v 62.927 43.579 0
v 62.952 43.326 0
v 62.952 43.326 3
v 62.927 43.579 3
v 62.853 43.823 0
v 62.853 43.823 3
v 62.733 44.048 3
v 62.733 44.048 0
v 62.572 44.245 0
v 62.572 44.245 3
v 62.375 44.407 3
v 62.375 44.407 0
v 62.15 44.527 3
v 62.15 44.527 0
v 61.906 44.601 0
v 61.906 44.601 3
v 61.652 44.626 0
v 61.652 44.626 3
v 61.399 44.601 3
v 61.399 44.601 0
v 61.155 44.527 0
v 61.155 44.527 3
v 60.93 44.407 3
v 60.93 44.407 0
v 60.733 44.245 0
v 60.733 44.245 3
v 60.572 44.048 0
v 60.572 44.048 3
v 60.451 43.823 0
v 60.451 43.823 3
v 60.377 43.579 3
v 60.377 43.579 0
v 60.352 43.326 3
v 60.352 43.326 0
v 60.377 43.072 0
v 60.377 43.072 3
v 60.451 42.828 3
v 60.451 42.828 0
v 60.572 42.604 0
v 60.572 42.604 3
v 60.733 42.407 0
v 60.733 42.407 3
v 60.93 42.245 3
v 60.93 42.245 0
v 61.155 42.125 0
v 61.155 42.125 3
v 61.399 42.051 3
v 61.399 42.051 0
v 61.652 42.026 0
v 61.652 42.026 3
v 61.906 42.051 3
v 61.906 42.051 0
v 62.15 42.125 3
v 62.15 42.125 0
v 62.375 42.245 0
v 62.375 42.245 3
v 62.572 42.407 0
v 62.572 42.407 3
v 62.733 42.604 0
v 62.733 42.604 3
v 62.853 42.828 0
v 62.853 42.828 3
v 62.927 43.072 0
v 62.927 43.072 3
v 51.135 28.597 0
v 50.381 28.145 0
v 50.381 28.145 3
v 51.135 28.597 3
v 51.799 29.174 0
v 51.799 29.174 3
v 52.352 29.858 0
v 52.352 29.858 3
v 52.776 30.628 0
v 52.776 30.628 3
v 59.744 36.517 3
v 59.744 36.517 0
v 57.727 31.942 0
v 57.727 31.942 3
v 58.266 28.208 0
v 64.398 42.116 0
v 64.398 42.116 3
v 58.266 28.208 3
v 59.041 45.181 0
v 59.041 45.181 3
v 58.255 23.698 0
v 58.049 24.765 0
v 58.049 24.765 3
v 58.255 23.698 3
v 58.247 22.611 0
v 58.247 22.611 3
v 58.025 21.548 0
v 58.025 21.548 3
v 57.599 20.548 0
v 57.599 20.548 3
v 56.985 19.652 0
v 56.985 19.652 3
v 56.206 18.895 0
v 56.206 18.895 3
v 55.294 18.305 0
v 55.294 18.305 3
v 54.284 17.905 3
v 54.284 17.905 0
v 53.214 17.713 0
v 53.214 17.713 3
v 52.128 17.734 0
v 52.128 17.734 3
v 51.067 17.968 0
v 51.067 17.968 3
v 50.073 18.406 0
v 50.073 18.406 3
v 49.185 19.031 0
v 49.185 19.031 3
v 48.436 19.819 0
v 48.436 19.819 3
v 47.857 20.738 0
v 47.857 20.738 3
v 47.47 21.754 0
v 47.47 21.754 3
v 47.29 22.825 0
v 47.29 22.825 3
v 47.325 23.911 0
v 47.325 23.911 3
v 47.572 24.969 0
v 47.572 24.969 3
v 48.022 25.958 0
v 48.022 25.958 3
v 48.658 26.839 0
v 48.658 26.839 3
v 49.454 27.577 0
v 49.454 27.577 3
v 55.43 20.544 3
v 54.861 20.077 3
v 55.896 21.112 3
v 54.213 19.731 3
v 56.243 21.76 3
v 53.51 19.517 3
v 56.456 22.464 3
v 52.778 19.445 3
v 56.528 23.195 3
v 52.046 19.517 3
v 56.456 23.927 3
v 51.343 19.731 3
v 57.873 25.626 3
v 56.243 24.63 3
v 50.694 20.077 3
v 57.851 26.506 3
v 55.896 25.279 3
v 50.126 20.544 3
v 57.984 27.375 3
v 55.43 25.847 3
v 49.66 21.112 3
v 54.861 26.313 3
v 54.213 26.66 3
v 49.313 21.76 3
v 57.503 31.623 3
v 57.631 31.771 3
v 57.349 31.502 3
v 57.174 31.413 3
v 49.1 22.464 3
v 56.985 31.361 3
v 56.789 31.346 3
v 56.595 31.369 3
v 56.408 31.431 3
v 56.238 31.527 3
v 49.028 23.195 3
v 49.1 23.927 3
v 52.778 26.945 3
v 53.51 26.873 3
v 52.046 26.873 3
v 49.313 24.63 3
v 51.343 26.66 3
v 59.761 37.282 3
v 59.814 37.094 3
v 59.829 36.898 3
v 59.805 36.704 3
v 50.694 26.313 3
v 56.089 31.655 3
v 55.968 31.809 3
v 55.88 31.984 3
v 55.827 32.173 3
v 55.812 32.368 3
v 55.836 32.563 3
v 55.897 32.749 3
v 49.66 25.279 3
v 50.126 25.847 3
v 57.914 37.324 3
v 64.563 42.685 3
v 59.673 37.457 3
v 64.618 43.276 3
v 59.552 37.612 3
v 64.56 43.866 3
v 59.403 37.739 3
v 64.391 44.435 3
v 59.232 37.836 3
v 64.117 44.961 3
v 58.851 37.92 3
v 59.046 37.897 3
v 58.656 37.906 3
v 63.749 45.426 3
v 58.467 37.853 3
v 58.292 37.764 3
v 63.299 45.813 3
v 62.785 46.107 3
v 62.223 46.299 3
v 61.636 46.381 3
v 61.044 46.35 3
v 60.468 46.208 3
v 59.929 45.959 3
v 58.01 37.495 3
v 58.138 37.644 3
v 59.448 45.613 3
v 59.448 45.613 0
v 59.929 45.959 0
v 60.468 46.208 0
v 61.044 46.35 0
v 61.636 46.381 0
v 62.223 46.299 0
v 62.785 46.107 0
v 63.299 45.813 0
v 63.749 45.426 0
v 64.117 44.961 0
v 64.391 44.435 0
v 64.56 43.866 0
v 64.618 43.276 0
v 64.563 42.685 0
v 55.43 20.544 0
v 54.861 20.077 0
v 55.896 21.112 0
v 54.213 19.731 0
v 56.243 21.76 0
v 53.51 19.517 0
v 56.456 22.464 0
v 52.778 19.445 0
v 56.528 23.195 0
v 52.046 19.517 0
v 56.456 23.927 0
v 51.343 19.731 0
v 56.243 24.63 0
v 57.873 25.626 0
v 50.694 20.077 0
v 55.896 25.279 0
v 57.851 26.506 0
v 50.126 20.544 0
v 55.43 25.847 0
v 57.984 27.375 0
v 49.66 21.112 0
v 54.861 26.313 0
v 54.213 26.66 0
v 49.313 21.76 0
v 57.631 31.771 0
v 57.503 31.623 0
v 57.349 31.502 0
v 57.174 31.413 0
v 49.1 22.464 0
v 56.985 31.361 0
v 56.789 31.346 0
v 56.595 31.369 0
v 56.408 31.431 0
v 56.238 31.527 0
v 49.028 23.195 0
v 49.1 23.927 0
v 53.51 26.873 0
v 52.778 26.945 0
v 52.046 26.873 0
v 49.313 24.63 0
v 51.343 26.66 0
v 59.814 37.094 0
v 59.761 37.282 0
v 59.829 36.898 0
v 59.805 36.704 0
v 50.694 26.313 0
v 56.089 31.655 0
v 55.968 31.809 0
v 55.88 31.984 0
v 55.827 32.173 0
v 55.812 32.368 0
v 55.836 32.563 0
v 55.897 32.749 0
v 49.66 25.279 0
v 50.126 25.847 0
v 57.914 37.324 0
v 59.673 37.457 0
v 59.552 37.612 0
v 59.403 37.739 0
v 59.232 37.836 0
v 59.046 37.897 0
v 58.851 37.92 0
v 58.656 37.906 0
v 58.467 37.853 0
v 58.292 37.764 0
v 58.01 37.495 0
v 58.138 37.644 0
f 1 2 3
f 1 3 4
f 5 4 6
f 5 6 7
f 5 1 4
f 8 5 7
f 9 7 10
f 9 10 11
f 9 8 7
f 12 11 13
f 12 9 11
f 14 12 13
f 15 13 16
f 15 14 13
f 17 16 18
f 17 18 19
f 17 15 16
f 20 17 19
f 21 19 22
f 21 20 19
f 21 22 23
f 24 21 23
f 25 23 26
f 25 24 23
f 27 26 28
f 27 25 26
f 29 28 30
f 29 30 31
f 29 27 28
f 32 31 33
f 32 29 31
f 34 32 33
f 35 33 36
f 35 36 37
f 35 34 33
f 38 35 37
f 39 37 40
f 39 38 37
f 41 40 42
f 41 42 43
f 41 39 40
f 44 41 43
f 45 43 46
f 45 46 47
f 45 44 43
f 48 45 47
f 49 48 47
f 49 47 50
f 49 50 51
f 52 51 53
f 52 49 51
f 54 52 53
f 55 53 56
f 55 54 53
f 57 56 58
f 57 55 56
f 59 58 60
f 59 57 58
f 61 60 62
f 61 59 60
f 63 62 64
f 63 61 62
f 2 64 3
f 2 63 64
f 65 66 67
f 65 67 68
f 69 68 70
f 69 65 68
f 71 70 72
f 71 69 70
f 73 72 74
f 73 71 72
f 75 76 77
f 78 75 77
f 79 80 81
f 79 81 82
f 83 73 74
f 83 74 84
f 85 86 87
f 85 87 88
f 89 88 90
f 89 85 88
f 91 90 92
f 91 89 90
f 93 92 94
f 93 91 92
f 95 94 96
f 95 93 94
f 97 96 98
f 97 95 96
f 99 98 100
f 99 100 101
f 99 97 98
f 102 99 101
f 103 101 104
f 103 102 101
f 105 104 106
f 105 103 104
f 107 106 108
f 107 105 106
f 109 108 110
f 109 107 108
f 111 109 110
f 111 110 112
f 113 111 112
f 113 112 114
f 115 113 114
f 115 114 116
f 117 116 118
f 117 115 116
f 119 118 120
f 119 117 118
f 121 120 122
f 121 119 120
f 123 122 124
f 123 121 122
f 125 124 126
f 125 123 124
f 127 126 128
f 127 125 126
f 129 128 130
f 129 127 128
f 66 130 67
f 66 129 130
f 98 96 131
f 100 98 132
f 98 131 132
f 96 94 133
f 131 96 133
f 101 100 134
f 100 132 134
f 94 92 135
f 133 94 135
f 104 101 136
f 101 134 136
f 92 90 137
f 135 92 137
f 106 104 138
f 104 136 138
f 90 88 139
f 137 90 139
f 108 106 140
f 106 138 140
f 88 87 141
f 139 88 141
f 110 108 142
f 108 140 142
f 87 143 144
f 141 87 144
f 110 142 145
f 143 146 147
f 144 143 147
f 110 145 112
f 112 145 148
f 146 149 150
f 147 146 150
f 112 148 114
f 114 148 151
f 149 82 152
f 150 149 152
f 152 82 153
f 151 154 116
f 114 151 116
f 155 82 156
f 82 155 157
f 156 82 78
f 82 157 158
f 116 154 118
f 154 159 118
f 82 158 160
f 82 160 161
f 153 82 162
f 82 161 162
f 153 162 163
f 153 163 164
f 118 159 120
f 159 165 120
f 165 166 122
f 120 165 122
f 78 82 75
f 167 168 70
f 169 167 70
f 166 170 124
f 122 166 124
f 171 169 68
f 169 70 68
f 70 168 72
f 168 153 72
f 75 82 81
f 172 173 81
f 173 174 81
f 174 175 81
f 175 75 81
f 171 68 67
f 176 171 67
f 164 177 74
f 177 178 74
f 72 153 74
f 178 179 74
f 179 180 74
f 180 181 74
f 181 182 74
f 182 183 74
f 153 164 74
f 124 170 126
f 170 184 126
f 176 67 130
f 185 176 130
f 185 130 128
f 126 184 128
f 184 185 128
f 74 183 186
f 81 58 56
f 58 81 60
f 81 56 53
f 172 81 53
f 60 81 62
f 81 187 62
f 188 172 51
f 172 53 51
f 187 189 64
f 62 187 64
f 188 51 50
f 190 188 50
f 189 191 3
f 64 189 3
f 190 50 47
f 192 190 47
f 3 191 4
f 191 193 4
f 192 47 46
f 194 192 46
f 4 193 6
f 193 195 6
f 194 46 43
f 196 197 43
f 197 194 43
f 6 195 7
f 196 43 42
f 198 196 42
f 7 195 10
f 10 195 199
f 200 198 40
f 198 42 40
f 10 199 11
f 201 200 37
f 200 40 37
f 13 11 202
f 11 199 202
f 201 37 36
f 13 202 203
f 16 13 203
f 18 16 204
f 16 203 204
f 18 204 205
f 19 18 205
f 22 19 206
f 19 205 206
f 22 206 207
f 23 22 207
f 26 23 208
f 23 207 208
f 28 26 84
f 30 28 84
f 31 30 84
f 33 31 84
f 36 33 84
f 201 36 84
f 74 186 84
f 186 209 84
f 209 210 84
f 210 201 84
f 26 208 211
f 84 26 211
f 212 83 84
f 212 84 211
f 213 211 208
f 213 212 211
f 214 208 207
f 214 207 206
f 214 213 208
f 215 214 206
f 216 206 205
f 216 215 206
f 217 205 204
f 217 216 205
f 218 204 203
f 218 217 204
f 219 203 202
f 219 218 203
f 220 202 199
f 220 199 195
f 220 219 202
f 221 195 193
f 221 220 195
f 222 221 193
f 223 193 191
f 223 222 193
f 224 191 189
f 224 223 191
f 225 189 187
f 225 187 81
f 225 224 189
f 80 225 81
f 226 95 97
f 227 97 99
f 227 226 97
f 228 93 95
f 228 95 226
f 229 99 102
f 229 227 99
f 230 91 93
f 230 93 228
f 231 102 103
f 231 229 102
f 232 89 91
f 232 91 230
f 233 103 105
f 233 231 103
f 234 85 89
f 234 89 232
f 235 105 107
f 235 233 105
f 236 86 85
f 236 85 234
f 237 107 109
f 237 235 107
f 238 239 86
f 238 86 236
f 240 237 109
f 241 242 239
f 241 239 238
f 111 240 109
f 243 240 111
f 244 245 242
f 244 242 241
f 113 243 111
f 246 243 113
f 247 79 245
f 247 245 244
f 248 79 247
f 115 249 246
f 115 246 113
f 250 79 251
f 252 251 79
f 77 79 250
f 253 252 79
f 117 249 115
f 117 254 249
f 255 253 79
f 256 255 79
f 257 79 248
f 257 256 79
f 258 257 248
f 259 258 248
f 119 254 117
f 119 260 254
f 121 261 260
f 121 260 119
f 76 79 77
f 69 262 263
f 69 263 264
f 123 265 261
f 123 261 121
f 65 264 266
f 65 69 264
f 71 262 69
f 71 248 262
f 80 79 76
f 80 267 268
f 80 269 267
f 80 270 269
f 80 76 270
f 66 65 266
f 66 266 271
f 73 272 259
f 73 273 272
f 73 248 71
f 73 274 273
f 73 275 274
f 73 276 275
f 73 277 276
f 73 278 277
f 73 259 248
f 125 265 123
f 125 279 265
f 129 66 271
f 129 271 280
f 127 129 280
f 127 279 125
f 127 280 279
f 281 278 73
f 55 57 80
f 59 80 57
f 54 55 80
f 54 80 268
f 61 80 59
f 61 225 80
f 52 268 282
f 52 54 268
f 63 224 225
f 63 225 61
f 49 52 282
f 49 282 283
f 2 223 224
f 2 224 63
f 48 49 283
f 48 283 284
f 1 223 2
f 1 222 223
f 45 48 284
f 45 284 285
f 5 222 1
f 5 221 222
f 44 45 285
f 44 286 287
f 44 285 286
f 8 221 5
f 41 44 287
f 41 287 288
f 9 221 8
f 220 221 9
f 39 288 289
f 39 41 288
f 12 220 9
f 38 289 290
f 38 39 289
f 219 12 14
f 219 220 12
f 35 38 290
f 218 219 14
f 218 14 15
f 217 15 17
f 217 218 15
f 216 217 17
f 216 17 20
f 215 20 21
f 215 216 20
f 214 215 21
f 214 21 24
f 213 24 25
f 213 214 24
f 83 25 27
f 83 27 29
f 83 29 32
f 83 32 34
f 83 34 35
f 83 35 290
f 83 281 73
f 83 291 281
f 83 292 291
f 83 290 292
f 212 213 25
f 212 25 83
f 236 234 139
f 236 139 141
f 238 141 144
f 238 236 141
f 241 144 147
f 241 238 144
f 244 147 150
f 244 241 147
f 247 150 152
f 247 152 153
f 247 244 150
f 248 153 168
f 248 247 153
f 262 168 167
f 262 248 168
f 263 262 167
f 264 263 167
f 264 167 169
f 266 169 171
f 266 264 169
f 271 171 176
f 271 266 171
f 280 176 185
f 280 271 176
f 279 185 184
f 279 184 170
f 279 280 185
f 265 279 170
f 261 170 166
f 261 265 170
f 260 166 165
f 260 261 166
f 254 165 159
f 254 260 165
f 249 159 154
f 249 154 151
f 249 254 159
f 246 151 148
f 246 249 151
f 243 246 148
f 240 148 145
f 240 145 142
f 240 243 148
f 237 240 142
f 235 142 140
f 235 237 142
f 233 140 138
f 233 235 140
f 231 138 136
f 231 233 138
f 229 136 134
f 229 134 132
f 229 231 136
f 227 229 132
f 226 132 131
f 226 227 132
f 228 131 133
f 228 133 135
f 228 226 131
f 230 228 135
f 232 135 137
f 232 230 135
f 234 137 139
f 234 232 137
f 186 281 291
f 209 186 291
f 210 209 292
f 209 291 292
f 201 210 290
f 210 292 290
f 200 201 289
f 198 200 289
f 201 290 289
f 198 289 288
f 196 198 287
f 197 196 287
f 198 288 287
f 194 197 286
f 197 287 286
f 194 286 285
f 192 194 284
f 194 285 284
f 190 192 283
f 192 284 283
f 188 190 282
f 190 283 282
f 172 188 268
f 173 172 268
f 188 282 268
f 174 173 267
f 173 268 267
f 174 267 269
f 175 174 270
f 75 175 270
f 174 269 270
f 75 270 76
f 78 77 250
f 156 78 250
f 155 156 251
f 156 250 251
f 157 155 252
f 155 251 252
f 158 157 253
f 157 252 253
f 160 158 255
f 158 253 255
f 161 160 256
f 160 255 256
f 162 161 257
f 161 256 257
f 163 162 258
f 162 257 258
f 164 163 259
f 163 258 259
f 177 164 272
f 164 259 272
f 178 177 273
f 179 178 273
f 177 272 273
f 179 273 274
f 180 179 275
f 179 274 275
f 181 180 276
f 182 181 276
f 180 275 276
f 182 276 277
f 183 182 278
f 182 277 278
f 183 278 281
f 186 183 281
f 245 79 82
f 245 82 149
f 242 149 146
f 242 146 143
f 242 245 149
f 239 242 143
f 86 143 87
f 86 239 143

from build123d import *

# Parameters (mm, degrees)
MODEL_R             = 3.75005
MODEL_R_2           = 1.300000002
BOSS_EXTRUDE1_DEPTH = 3


with BuildPart() as part:
    # Model → Boss-Extrude1 (new body)
    with BuildSketch(Plane.XY):
        with BuildLine():
            Line((64.397506493, 42.115672183), (58.266368088, 28.207946902))
            ThreePointArc((58.266368088, 28.207946902), (57.851399273, 26.505567789), (58.049287259, 24.764552536))
            ThreePointArc((58.049287259, 24.764552536), (50.559319275, 18.162603648), (50.380520329, 28.145257626))
            ThreePointArc((50.380520329, 28.145257626), (51.799316654, 29.173568367), (52.776187572, 30.6282605))
            Line((52.776187572, 30.6282605), (59.040732097, 45.181361317))
            ThreePointArc((59.040732097, 45.181361317), (63.049082158, 45.972402409), (64.397506493, 42.115672183))
        make_face()
        with Locations((52.777915011, 23.195230557)):
            Circle(MODEL_R, mode=Mode.SUBTRACT)
        with Locations((61.652416233, 43.325828981)):
            Circle(MODEL_R_2, mode=Mode.SUBTRACT)
        with BuildLine():
            Line((59.743787463, 36.517324284), (57.726859465, 31.942173855))
            ThreePointArc((57.726859465, 31.942173855), (56.408443779, 31.430529369), (55.896799293, 32.748945054))
            Line((55.896799293, 32.748945054), (57.913727291, 37.324095484))
            ThreePointArc((57.913727291, 37.324095484), (59.232142977, 37.83573997), (59.743787463, 36.517324284))
        make_face(mode=Mode.SUBTRACT)
    extrude(amount=BOSS_EXTRUDE1_DEPTH)


solid = part.part
